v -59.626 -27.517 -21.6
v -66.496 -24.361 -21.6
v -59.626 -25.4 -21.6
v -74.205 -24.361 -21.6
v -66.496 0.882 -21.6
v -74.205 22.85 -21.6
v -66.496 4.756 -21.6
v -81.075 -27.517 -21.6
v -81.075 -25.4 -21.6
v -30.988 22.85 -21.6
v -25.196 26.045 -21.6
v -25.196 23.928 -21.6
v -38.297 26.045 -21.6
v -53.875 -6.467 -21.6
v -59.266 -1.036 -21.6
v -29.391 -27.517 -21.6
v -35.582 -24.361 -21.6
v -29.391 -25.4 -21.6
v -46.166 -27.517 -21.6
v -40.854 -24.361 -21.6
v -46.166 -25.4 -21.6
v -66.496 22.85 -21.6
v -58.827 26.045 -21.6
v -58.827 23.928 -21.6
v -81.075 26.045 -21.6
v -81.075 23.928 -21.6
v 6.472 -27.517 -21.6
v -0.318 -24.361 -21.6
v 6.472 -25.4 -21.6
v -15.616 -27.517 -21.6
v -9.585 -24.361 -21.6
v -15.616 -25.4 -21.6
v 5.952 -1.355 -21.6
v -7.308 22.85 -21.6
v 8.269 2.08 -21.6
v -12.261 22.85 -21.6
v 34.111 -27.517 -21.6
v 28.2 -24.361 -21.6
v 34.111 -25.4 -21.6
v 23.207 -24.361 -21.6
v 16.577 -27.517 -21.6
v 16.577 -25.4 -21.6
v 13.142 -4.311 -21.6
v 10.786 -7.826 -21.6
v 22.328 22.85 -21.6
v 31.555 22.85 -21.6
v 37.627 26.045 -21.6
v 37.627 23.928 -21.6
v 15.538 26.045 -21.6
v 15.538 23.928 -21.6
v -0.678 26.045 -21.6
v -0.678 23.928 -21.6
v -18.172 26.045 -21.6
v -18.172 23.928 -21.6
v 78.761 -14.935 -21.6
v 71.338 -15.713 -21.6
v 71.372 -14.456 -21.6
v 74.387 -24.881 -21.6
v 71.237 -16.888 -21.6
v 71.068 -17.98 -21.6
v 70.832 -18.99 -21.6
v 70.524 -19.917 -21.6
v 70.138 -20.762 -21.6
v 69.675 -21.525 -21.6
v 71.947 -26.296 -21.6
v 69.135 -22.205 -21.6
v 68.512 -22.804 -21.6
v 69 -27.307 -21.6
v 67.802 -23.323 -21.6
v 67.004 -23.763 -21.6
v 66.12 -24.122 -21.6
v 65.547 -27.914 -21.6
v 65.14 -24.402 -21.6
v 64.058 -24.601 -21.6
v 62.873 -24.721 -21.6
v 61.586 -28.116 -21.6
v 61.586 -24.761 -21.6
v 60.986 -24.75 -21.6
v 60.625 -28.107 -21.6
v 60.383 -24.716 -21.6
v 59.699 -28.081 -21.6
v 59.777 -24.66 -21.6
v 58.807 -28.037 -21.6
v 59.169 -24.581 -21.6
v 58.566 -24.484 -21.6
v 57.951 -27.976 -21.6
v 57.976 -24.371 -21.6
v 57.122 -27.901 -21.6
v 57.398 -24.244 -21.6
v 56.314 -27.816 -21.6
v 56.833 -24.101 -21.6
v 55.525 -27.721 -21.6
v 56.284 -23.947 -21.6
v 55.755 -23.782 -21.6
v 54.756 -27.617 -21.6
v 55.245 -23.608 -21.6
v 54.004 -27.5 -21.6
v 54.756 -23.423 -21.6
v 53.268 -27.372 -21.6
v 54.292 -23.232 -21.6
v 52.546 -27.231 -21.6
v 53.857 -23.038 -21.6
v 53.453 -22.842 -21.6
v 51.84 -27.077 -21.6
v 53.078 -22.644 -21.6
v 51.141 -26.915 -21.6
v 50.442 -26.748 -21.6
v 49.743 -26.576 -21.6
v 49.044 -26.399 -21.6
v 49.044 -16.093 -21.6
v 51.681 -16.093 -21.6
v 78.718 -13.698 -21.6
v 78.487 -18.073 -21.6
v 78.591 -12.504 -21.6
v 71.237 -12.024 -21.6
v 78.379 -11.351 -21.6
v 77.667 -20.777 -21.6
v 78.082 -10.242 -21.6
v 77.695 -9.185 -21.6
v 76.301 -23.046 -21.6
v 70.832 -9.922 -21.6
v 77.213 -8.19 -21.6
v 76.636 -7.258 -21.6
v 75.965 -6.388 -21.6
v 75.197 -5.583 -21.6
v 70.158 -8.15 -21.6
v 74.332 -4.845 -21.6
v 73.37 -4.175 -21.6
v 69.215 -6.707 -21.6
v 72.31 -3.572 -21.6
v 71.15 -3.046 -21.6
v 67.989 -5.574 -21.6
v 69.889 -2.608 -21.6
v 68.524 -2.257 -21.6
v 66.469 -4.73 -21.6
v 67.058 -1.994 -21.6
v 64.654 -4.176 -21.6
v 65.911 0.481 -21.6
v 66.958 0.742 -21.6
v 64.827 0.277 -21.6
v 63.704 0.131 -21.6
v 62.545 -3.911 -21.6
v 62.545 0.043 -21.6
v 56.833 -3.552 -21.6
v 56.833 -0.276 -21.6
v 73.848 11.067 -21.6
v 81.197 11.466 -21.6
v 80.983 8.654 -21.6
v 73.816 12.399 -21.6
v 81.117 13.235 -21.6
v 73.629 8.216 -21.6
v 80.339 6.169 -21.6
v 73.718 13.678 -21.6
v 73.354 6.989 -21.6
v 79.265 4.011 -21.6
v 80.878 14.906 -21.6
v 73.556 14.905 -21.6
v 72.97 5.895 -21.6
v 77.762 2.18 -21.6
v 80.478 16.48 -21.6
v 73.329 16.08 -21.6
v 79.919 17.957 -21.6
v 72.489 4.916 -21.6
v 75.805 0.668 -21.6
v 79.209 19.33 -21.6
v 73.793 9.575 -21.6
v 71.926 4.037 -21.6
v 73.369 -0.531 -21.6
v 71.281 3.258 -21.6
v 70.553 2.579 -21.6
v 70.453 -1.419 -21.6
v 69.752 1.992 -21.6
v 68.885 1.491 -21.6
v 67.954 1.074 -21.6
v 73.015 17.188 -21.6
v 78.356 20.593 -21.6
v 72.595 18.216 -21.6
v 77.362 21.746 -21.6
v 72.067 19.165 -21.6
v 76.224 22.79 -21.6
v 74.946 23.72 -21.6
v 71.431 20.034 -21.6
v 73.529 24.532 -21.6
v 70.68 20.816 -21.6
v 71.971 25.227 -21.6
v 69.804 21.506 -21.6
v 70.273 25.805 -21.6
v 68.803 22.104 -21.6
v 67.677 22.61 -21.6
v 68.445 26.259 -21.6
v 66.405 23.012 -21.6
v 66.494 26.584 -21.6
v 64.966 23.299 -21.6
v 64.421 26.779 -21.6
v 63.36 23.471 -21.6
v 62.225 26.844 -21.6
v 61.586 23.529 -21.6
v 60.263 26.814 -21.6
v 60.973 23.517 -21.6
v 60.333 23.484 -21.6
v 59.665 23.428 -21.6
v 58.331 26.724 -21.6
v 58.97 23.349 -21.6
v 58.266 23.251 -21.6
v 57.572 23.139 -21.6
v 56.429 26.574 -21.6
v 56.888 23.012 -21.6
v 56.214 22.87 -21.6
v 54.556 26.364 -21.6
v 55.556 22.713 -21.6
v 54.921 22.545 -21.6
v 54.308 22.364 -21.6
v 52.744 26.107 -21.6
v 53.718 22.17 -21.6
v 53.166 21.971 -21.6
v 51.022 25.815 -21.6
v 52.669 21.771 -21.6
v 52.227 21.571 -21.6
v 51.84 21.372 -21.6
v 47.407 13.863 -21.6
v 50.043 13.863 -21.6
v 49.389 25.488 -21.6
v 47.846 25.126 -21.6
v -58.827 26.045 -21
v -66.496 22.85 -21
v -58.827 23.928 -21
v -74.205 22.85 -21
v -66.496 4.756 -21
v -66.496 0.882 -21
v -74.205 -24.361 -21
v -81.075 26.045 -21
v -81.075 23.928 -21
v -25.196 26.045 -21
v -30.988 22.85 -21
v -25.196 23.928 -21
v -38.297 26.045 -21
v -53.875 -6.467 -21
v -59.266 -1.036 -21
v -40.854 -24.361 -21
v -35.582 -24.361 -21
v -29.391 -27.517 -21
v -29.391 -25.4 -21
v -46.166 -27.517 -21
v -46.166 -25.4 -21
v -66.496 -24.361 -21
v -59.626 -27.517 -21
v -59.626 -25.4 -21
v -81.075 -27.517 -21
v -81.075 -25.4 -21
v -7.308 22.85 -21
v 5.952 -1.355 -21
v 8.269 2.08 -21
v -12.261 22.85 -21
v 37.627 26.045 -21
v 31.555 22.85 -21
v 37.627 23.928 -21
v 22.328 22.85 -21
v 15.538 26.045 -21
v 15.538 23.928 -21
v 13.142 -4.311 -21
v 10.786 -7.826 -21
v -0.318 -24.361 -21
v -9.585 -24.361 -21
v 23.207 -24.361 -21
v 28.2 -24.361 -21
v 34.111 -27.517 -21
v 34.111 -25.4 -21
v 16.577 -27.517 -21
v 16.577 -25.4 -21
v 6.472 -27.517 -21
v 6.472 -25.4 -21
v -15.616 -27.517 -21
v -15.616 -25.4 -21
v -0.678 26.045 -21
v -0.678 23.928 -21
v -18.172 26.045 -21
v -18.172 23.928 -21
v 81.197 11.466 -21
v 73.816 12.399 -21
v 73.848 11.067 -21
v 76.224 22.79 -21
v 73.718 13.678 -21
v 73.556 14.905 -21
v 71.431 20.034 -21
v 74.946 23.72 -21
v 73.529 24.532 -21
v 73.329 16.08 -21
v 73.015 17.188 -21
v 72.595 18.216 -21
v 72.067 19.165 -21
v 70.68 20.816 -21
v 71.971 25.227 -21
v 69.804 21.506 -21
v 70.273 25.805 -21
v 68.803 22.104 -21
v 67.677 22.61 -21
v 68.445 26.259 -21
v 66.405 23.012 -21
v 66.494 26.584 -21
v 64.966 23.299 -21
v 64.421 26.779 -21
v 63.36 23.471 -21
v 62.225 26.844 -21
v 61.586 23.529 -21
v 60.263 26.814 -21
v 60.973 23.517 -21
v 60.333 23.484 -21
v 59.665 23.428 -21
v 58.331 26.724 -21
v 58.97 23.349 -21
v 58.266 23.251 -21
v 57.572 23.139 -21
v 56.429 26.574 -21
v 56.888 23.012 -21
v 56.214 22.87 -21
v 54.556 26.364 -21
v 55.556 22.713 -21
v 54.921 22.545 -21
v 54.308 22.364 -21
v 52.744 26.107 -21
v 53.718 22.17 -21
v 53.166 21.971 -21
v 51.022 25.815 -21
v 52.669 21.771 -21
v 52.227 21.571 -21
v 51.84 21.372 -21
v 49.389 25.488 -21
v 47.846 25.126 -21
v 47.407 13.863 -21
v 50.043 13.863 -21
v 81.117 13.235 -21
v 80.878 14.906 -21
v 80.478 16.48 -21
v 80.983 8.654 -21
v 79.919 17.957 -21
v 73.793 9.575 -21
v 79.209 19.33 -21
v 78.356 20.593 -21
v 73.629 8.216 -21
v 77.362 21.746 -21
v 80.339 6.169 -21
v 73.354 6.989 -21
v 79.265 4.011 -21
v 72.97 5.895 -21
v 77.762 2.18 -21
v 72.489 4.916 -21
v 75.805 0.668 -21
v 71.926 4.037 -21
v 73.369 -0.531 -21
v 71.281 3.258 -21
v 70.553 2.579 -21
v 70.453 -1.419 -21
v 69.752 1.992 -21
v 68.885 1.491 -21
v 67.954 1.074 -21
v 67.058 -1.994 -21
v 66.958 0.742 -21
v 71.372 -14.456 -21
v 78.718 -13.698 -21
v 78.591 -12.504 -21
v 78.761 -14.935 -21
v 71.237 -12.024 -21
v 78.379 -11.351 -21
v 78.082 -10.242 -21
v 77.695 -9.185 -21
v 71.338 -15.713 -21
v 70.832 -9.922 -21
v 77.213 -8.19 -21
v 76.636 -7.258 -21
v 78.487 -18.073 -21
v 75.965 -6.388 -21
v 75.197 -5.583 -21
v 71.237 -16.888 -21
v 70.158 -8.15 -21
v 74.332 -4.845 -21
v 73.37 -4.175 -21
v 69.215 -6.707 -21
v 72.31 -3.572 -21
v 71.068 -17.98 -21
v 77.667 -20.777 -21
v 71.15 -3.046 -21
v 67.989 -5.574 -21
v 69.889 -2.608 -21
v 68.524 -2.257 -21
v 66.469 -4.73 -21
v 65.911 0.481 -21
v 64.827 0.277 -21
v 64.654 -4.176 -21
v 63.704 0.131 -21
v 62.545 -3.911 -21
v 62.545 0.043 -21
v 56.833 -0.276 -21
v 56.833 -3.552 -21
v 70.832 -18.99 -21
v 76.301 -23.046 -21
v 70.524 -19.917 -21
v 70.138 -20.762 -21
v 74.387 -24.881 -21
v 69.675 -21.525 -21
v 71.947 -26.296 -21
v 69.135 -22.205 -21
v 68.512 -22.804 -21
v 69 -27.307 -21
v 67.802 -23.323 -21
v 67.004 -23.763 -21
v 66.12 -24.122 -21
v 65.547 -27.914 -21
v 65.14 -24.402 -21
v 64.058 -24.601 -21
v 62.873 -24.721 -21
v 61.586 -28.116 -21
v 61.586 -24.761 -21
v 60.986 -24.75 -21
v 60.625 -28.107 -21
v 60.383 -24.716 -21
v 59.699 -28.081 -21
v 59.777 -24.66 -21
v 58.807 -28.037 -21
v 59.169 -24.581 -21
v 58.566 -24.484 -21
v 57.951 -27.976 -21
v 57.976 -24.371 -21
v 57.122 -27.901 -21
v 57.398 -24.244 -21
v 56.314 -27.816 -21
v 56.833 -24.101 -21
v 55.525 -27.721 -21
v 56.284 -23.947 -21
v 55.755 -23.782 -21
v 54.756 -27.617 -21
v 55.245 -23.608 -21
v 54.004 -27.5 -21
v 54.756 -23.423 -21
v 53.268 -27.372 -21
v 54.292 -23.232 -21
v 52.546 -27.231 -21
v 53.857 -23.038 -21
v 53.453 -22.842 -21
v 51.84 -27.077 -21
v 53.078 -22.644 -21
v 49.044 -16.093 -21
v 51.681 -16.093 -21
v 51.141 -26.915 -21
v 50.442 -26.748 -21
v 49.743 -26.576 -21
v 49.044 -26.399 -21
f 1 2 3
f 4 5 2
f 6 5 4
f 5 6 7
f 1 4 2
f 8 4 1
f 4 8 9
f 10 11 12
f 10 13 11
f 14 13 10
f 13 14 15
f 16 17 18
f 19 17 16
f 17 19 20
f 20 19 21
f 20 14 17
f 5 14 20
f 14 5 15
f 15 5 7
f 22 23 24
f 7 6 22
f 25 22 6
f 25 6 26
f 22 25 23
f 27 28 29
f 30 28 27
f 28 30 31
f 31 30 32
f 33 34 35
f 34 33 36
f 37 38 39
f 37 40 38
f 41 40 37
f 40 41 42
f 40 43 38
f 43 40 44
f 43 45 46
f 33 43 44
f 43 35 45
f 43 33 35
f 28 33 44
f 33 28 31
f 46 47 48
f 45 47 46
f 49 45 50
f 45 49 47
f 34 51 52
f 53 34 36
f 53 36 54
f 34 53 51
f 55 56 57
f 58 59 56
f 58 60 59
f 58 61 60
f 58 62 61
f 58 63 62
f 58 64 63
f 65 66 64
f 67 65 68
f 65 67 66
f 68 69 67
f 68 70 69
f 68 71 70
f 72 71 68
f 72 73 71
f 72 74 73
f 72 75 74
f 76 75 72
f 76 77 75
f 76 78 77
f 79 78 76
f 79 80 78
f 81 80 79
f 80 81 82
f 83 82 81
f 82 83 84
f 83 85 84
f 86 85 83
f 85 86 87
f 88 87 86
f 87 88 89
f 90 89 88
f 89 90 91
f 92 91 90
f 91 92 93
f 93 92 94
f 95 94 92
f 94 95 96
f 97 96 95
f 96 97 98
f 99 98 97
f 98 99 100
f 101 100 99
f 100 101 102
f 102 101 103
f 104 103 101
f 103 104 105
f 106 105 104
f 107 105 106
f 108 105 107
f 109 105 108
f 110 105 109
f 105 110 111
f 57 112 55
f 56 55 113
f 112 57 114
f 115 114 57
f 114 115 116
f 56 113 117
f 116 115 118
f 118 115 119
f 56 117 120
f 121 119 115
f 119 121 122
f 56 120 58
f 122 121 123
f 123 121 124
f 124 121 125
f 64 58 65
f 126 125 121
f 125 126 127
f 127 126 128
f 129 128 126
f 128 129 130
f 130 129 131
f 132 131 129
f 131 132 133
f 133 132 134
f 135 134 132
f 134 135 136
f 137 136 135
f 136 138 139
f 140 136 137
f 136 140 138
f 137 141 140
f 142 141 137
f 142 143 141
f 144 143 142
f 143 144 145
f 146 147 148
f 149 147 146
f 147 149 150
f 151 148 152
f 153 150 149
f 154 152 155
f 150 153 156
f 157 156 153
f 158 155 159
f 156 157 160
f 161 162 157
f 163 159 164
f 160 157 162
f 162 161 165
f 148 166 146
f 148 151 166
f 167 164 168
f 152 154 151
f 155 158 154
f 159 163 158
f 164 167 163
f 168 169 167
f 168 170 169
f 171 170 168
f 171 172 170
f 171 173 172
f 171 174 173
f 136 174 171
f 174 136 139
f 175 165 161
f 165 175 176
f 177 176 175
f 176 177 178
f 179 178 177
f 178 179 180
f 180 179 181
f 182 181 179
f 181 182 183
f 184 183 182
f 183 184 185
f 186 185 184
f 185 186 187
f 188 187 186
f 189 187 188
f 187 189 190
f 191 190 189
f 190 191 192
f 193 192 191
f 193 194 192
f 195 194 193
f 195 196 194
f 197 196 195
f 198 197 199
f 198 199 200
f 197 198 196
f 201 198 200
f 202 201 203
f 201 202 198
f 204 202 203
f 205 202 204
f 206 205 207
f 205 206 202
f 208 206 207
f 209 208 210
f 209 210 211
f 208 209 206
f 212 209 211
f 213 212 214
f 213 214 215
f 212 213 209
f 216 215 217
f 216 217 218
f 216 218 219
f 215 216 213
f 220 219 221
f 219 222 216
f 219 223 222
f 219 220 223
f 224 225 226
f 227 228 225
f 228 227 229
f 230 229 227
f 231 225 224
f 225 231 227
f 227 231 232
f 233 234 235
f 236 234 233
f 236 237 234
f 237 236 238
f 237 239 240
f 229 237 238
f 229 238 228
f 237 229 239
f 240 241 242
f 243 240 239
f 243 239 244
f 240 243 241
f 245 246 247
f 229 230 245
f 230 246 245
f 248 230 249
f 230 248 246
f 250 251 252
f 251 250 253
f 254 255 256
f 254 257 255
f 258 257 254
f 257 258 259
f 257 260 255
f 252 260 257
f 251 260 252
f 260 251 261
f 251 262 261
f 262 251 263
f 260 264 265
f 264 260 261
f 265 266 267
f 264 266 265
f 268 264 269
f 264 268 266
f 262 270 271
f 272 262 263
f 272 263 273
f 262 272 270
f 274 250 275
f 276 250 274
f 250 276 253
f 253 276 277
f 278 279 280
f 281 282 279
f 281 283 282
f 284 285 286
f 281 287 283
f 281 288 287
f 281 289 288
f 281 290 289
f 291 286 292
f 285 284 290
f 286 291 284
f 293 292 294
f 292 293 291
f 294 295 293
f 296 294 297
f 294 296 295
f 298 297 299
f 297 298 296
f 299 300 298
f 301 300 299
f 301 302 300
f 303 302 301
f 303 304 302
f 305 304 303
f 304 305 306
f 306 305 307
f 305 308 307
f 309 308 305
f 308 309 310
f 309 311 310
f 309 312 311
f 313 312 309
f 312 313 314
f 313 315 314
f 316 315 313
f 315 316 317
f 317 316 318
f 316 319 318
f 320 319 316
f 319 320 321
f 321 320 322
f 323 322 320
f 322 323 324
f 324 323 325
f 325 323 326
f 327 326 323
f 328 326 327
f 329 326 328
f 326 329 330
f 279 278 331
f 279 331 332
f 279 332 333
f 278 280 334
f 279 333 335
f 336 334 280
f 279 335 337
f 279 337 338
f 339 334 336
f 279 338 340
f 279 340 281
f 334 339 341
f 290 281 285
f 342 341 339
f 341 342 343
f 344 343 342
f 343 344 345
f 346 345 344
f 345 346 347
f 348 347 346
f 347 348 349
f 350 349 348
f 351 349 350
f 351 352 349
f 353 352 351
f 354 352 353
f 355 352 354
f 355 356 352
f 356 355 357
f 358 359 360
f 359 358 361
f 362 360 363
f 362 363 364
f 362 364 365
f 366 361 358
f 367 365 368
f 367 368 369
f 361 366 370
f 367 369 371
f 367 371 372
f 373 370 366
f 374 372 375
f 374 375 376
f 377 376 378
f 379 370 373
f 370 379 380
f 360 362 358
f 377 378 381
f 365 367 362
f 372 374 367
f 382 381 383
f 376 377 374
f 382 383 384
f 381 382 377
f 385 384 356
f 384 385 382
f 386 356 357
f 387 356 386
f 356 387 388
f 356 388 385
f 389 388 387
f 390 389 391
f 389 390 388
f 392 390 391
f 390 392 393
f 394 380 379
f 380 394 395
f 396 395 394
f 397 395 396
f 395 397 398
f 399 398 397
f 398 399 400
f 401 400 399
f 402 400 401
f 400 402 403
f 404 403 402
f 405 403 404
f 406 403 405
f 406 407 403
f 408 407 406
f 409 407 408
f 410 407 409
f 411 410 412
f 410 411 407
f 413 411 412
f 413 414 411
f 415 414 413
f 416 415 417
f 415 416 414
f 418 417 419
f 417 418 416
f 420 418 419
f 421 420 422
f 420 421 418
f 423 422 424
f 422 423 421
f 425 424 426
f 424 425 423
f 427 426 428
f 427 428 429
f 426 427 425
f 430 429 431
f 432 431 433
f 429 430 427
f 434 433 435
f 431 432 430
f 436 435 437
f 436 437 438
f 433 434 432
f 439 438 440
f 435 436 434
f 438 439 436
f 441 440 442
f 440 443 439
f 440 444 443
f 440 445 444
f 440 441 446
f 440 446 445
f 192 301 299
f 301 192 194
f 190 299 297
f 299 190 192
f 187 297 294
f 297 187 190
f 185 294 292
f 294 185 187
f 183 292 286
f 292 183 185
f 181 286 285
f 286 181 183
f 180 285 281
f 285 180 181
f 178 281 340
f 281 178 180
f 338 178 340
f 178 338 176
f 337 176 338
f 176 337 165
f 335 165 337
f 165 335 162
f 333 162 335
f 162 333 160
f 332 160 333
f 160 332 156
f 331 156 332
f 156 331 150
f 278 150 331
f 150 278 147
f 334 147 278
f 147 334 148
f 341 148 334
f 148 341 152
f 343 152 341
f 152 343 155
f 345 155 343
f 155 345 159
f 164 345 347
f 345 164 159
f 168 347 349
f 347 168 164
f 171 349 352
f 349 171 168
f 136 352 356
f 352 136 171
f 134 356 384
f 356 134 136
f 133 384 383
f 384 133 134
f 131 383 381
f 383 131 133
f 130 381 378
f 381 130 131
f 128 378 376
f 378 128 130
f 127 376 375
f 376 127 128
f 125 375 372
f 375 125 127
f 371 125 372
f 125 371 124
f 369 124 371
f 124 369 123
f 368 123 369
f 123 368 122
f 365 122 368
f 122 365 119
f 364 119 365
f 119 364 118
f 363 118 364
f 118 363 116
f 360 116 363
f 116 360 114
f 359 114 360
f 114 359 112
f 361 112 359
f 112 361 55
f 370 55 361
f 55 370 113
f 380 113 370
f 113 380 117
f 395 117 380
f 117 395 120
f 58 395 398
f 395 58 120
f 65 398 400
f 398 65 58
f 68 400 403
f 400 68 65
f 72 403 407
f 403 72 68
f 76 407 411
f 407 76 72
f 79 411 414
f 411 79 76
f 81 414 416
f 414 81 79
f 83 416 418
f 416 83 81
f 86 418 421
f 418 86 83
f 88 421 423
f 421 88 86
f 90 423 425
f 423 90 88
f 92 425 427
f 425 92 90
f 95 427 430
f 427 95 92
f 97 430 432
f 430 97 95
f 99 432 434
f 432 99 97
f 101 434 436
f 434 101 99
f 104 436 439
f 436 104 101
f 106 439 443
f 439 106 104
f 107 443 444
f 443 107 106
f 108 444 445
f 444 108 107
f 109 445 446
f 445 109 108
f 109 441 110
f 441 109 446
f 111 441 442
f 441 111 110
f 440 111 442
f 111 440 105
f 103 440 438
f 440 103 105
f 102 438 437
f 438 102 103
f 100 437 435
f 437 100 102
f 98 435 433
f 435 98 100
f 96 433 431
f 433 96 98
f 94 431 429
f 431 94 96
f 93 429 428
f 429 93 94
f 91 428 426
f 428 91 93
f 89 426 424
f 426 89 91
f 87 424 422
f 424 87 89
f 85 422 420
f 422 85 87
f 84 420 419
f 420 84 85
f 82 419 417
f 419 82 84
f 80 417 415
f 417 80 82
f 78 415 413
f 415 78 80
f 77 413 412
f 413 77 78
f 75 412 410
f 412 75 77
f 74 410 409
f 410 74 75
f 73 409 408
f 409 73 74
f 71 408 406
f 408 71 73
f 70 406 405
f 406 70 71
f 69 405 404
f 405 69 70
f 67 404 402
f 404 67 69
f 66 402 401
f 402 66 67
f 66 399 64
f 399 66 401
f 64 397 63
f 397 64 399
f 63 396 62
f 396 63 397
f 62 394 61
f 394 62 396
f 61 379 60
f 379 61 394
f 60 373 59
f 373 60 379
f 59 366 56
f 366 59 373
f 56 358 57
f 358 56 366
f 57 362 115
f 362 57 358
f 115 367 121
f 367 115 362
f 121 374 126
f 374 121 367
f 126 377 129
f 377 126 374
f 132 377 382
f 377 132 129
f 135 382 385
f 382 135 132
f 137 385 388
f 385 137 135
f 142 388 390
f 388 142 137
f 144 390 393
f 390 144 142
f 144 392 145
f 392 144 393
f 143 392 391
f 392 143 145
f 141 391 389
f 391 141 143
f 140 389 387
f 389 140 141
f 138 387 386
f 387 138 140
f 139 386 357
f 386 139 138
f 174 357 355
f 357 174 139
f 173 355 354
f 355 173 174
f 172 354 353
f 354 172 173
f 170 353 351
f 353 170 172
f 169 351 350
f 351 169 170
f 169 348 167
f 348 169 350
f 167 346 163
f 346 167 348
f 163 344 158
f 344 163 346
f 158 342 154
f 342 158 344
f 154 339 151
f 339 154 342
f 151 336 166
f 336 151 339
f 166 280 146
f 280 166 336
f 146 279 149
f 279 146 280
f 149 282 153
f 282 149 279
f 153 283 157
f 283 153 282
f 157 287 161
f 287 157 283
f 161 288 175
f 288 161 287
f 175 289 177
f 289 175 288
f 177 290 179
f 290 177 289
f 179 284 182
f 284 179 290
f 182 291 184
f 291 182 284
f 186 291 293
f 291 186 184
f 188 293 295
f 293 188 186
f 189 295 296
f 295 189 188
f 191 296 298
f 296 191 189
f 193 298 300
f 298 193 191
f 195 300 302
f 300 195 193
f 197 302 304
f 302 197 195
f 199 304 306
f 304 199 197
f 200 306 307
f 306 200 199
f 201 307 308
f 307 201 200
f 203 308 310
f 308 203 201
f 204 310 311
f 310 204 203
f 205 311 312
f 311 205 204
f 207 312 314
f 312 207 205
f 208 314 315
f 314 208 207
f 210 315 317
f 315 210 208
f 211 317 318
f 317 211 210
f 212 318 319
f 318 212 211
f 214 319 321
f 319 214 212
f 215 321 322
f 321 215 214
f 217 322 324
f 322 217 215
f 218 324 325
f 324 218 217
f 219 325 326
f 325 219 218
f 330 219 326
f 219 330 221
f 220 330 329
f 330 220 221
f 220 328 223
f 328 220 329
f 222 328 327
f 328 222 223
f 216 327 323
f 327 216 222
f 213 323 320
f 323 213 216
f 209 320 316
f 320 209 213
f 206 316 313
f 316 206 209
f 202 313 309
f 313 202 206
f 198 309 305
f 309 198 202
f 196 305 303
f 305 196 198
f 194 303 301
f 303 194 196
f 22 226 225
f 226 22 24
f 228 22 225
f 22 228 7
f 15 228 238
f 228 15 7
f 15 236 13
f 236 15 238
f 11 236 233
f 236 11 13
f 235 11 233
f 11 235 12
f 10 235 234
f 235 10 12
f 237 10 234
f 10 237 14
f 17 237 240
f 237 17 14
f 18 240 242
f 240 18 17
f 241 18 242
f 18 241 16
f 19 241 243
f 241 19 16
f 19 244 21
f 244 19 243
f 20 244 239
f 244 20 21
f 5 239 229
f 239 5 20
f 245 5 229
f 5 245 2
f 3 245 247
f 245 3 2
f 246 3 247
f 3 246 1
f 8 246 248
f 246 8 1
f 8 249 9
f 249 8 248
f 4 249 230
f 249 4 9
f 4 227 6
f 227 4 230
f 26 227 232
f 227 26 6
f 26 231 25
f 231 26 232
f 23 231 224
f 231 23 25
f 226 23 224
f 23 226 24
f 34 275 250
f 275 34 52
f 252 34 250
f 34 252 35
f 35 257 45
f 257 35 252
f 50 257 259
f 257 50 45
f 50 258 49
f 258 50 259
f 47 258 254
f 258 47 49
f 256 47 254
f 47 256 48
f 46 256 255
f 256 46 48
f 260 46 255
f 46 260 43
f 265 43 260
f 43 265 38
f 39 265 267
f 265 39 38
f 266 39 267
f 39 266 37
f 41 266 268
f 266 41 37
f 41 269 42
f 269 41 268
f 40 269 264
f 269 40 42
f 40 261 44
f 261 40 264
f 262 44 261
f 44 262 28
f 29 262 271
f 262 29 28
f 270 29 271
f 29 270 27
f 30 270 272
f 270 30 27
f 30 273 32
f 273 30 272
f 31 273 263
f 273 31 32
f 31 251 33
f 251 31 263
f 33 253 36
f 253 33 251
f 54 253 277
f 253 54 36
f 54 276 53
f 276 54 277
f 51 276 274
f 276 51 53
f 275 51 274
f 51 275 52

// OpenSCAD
// file: kx3-dust-cover.scad
// Measured parameters
kx3_width = 190;
kx3_height = 88;
kx3_corner_rounding_radius = 1.95;

// Constrained but not maximized parameters
horizontal_inward_clearance_bottom = 2;  // max 3 for VFO knob base
horizontal_inward_clearance_top = 4;
vertical_side_jack_clearance = 8;  // max 9 or so depending on accessory plug diameter
panel_control_clearance_height = 21;

// Chosen parameters
vertical_wall_thickness = 0.8;
horizontal_wall_thickness = 0.6;  // three layers to ensure good fusion of the logo
epsilon = 0.02;
$with_label_cut=false;


printable();


module printable() {
    rotate([180, 0, 0]) main();
}

module preview() {
    difference() {
        main();
        translate([0, 0, -500])
        cube([1000, 1000, 1000]);
    }
}

module main() {
    difference() {
        exterior_volume();
        interior_volume();
        
        if ($with_label_cut)
        label_cut();
    }
}

module label_cut() {
    // Times appears to be the font used for the Elecraft and KX3 branding (in small-caps)
    translate([2 /* fudge */, 0, panel_control_clearance_height - epsilon])
    linear_extrude(horizontal_wall_thickness * 2)
    text("KX3", spacing=1.1, size=kx3_width * 0.31, font="Times", halign="center", valign="center");
}

module interior_volume() {
    // Rim
    mirror([0, 0, 1])
    translate([0, 0, -epsilon])
    linear_extrude(vertical_side_jack_clearance + epsilon * 2)
    offset(r=kx3_corner_rounding_radius, $fn=30)
    offset(delta=-kx3_corner_rounding_radius)
    square([kx3_width, kx3_height], center=true);
    
    // Volume for panel controls
    panel_clearance_volume();
}

module exterior_volume() {
    // Rim
    mirror([0, 0, 1])
    translate([0, 0, -horizontal_wall_thickness])
    hull() {
        rim_outer_radius = kx3_corner_rounding_radius + vertical_wall_thickness;
        linear_extrude(vertical_side_jack_clearance + horizontal_wall_thickness)
        corner_round(rim_outer_radius)
        rim_2d();
        
        // create 45° overhang support
        // Precise form of this would be matching the slope of the horizontal clearance but that would be a line intersection problem, so fudge it.
        overhang_inset = horizontal_inward_clearance_bottom * 1.6;
        translate([0, 0, -overhang_inset])
        linear_extrude(epsilon)
        offset(delta=-overhang_inset)
        rim_2d();
    }
    
    // Volume for panel controls
    minkowski() {
        // Shape for top bevel and side walls — a pyramid
        hull() {
            linear_extrude(epsilon)
            square([1, 1] * vertical_wall_thickness * 2, center=true);

            // 45° chamfered top
            chamfer = horizontal_wall_thickness;
            linear_extrude(chamfer)
            offset(delta=-chamfer)
            square([1, 1] * vertical_wall_thickness * 2, center=true);
        }
        panel_clearance_volume();
    }
    
    module panel_2d() {
        square([
            kx3_width - horizontal_inward_clearance_bottom * 2 + vertical_wall_thickness * 2, 
            kx3_height - horizontal_inward_clearance_bottom * 2 + vertical_wall_thickness * 2
        ], center=true);
    }
    
    module rim_2d() {
        square([kx3_width + vertical_wall_thickness * 2, kx3_height + vertical_wall_thickness * 2], center=true);
    }
}

module panel_clearance_volume() {
    hull() {
        // bottom
        linear_extrude(epsilon)
        corner_round(1)
        square([
            kx3_width - horizontal_inward_clearance_bottom * 2,
            kx3_height - horizontal_inward_clearance_bottom * 2,
        ], center=true);

        // top (bottom as printed)
        translate([0, 0, panel_control_clearance_height])
        mirror([0, 0, 1])
        linear_extrude(epsilon)
        corner_round(1)
        square([
            kx3_width - horizontal_inward_clearance_top * 2,
            kx3_height - horizontal_inward_clearance_top * 2,
        ], center=true);
    }
}

module corner_round(r) {
    offset(r=r, $fn=30)
    offset(delta=-r)
    children();
}
// main file
use <kx3-dust-cover.scad>


printable();


module printable() {
    rotate([180, 0, 0]) main();
}

module main() {
    intersection() {
        difference() {
            exterior_volume();
            interior_volume();
        }
            
        label_cut();
    }
}
